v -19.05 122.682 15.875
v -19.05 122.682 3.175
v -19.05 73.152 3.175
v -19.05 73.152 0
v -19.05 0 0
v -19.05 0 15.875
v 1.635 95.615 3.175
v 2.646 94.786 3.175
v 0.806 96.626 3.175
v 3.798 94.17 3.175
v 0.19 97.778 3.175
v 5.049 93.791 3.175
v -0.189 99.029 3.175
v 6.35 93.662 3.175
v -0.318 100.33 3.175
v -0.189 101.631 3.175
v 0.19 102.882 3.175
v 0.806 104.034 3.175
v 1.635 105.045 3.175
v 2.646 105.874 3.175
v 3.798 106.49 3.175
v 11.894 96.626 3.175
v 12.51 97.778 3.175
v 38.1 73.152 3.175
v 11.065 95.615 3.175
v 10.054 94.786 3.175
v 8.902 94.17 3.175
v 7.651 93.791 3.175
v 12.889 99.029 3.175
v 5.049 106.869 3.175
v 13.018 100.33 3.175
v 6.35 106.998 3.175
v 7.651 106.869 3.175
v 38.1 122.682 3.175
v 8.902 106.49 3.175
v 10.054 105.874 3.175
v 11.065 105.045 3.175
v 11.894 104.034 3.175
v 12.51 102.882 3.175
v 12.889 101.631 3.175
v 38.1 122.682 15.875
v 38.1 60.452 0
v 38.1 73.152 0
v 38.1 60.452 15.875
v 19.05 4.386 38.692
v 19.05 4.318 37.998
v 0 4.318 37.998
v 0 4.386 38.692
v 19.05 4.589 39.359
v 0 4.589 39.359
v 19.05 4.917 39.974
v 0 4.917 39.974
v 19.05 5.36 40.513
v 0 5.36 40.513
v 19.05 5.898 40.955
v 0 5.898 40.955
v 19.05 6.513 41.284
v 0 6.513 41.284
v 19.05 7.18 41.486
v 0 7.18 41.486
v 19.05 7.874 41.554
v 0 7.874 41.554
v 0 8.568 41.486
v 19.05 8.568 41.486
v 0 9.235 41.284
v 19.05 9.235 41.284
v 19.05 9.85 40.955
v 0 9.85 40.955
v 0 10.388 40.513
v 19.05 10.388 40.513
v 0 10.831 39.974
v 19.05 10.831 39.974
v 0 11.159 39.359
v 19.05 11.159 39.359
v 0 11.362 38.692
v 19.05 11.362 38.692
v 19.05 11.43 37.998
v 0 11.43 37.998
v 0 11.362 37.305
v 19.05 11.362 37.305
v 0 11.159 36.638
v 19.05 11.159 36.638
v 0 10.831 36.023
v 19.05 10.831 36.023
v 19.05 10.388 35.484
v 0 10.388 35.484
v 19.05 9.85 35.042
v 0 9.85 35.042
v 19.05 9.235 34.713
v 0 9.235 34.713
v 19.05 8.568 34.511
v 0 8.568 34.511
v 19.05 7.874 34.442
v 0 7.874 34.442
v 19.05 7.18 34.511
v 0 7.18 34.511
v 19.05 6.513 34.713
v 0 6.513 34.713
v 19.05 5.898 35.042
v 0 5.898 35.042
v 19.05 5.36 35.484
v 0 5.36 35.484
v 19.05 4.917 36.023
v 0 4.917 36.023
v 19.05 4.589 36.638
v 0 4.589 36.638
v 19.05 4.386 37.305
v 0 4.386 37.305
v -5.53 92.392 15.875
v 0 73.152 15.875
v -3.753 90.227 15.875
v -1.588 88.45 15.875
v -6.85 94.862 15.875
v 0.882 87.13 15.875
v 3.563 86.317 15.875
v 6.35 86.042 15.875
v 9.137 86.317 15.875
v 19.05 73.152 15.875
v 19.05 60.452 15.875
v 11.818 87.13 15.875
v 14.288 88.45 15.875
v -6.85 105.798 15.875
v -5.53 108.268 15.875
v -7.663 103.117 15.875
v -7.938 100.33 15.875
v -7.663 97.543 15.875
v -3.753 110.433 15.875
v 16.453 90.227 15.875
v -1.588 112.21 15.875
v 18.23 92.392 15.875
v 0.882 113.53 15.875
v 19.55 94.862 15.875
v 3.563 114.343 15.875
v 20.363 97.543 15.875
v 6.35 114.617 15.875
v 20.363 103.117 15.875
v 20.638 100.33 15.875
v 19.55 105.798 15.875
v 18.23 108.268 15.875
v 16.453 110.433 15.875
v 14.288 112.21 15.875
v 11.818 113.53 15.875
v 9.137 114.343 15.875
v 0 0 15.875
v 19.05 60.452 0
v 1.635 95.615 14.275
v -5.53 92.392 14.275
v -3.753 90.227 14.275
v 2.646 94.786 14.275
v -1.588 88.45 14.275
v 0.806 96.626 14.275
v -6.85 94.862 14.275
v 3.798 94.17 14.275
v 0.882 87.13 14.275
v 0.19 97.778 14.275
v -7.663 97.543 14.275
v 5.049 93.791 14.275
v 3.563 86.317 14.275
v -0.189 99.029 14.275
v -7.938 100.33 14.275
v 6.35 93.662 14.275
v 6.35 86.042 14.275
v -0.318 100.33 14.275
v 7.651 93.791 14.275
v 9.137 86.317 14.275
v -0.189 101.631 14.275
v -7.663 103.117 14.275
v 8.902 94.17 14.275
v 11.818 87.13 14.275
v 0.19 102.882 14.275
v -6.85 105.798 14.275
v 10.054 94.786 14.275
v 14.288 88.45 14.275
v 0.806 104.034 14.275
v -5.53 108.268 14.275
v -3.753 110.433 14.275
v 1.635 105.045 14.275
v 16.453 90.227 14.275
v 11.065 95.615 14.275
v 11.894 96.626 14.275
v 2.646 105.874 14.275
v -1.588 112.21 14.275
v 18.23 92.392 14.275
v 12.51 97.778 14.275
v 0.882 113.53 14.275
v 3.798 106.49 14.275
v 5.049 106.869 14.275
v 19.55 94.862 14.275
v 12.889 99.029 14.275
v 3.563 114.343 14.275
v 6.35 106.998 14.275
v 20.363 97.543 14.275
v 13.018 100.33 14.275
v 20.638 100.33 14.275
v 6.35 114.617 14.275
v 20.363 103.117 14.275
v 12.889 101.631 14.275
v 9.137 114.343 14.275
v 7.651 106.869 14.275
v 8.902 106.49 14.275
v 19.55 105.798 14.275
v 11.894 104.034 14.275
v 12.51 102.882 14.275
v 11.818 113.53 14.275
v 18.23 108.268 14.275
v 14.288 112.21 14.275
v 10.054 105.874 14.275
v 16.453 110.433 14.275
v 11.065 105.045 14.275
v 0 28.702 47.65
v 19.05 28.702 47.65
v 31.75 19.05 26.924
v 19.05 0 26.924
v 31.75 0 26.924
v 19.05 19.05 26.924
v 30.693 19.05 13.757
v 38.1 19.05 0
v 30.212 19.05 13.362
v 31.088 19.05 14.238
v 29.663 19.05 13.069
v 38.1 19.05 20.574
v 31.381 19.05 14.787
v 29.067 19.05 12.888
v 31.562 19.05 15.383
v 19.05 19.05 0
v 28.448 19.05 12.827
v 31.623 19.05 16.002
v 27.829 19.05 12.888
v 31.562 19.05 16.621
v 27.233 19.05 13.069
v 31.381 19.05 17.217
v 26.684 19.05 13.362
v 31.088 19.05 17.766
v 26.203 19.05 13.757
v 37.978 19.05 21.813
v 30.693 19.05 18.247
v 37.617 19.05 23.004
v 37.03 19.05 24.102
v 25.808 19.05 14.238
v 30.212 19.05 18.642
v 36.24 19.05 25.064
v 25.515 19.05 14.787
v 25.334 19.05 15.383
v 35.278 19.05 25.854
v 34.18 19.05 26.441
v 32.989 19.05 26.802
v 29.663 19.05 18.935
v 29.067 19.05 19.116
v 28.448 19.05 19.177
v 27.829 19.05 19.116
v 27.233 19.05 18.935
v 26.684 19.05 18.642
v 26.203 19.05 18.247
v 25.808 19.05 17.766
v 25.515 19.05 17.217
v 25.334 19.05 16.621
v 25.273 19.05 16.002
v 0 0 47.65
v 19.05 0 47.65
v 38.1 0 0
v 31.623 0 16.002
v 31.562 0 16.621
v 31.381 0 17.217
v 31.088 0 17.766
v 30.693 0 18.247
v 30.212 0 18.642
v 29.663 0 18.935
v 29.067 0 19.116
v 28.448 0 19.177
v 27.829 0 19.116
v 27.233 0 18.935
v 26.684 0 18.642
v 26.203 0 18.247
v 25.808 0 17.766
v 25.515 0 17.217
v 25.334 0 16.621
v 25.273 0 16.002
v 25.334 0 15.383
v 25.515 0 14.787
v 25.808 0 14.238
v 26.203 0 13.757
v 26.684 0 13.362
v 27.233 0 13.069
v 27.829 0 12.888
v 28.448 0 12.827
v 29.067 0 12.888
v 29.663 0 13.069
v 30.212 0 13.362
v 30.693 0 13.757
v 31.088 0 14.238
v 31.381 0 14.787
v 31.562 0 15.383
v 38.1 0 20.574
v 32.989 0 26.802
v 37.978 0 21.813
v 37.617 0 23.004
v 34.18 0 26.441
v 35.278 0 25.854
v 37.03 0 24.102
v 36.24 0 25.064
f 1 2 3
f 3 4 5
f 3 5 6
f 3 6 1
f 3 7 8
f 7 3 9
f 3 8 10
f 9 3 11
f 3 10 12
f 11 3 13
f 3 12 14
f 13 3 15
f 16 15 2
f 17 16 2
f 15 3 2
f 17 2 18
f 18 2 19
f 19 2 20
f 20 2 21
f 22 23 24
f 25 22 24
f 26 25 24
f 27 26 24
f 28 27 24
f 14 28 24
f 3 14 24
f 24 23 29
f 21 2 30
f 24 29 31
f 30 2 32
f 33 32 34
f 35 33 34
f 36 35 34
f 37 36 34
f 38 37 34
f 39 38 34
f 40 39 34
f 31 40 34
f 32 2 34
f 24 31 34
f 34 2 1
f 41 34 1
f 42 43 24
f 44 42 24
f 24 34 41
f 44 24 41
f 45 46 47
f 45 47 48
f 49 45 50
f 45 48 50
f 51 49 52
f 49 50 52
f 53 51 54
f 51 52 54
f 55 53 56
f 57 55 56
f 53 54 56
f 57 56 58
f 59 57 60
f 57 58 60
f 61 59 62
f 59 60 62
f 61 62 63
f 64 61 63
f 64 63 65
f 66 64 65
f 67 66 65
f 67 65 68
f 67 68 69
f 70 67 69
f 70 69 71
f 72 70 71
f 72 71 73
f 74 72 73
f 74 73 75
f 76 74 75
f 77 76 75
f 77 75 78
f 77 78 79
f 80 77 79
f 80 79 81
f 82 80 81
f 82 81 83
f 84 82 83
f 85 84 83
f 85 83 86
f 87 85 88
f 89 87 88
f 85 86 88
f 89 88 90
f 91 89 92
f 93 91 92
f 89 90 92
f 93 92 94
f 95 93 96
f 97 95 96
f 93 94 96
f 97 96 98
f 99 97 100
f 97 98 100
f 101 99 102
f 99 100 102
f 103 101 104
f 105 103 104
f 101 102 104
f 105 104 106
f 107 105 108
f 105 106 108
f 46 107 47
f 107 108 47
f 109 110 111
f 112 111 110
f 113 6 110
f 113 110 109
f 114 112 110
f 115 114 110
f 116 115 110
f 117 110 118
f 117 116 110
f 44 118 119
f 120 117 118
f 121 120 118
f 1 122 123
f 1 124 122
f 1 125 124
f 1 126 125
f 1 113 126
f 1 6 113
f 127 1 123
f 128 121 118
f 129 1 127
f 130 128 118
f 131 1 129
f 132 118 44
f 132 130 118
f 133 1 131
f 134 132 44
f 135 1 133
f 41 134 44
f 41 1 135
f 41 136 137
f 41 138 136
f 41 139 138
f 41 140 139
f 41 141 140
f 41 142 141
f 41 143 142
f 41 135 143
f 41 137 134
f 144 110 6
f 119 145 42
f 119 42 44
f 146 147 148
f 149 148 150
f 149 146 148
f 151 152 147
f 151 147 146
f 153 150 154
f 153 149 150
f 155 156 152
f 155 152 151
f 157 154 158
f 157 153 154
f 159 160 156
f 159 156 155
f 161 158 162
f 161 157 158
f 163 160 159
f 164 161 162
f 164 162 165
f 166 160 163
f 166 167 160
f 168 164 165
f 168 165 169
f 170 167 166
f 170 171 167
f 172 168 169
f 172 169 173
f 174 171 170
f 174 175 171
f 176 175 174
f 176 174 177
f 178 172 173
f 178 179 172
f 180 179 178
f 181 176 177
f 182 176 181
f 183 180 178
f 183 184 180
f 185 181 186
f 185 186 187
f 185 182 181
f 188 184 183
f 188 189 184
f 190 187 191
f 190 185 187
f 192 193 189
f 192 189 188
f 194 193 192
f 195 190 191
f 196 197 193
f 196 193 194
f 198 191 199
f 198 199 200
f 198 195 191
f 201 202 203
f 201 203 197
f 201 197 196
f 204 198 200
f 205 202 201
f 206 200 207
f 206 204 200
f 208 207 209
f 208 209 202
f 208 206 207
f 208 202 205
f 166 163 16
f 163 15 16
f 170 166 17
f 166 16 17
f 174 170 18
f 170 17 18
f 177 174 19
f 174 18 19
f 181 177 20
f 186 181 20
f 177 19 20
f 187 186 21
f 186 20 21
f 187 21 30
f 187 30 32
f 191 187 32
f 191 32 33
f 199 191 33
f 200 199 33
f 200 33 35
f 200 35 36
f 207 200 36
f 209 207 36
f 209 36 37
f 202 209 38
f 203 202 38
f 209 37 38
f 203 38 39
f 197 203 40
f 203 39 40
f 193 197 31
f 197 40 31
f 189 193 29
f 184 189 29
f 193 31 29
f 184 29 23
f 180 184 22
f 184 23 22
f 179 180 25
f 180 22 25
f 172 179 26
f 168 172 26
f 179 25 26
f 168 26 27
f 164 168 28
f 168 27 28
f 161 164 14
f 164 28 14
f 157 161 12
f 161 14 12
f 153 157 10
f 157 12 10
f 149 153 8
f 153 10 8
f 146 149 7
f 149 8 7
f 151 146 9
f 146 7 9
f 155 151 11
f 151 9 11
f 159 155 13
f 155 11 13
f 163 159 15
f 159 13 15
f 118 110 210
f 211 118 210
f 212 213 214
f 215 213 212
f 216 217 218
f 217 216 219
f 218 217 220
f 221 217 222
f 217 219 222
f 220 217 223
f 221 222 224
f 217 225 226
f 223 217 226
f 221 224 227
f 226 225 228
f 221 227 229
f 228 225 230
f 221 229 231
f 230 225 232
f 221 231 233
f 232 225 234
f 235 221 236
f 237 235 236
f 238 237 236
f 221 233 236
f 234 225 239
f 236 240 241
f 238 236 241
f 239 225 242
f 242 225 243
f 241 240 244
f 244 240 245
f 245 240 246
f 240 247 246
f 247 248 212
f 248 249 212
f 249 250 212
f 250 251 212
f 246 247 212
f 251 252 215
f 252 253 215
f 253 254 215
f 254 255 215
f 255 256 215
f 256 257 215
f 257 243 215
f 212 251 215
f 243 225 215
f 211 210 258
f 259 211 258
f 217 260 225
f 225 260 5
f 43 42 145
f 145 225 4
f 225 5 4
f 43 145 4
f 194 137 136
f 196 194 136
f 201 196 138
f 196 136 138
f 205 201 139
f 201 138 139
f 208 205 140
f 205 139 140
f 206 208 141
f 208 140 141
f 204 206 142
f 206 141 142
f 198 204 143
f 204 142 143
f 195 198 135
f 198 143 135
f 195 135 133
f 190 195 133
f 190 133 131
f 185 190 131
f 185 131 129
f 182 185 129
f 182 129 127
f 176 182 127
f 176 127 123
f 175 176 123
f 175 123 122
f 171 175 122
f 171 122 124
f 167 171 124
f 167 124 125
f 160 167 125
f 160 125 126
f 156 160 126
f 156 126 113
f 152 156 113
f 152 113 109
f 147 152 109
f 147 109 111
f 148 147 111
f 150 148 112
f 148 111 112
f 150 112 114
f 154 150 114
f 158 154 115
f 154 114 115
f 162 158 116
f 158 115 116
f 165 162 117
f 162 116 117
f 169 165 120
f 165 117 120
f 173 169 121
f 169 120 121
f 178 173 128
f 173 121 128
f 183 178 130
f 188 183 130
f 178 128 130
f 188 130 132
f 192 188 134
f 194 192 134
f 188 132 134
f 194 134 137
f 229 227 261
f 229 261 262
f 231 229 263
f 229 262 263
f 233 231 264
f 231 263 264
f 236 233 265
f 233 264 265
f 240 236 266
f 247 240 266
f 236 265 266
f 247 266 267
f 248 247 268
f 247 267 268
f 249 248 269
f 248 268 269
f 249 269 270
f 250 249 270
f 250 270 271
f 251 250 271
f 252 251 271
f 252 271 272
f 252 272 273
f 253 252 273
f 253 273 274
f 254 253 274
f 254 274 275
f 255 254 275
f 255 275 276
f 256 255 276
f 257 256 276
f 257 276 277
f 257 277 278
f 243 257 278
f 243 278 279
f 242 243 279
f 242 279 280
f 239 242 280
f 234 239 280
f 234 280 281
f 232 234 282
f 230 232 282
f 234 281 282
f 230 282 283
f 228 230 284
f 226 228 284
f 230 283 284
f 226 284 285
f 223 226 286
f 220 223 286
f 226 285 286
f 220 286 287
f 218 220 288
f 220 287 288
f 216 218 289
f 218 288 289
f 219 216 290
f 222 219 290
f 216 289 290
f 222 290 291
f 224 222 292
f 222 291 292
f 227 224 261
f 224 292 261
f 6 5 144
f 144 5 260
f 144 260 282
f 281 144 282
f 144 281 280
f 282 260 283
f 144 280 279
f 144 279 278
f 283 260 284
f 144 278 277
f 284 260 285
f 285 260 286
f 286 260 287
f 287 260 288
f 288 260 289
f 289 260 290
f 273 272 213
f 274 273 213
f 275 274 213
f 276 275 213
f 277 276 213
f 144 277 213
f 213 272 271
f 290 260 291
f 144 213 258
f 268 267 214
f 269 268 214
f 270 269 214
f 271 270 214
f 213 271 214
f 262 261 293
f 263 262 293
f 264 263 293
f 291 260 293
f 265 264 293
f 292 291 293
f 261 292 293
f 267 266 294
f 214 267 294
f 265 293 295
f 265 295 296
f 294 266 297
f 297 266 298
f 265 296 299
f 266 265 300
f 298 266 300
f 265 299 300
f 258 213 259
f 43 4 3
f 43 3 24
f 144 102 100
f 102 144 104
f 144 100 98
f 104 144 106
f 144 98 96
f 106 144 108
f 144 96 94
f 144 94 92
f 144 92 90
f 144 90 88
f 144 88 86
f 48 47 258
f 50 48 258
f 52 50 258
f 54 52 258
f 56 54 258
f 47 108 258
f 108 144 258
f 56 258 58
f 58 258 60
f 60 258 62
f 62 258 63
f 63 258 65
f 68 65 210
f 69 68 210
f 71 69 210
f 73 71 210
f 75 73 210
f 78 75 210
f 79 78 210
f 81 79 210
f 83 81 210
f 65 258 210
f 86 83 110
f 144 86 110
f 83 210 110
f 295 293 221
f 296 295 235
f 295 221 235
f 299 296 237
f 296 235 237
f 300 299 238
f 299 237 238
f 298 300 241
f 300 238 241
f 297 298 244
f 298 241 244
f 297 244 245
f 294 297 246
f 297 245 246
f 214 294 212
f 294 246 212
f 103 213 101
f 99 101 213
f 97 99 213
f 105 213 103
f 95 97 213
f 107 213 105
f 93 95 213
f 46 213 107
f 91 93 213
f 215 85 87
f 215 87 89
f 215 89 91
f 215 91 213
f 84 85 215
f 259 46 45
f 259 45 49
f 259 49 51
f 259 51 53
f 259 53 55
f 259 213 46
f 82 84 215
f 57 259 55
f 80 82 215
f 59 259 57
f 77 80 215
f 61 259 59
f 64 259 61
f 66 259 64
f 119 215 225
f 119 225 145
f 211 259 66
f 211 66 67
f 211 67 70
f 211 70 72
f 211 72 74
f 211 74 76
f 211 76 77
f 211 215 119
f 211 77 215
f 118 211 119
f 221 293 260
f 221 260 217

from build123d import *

# Parameters (mm, degrees)
F0_W            = 73.152
F0_H            = 15.875
F1_DEPTH        = 19.05
F3_D            = 7.112
F4_W            = 19.05
F4_H            = 26.924
F5_DEPTH        = 19.05
F7_D            = 6.35
F8_DEPTH        = 19.05
F9_DEPTH        = 49.53
F10_DEPTH       = 38.1
F11_DEPTH       = 12.7
F13_W           = 57.15
F13_H           = 49.53
F14_DEPTH       = 3.175
F16_D           = 13.335
F16_CBORE_D     = 28.575
F16_CBORE_DEPTH = 1.6002
F17_DEPTH       = 25.4


with BuildPart() as f1:
    # F0 (on Right) → F1 (new body)
    with BuildSketch(Plane.YZ):
        Polygon((0, 47.6504), (0, 15.875), (73.152, 15.875), (28.702, 47.6504), align=None)
        with Locations((36.576, 7.9375)):
            Rectangle(F0_W, F0_H)
    extrude(amount=F1_DEPTH)

    # F3 (through all)
    with Locations(Plane.YZ.offset(19.05)):
        with Locations((7.874, 37.9984)):
            Hole(F3_D / 2)

    # F4 (on face) → F5 (join)
    with BuildSketch(Plane.YZ.offset(19.05)):
        with Locations((9.525, 13.462)):
            Rectangle(F4_W, F4_H)
    extrude(amount=F5_DEPTH)

    # F7 (through all)
    with Locations(Plane(origin=(0, 19.05, 0), x_dir=(-1, 0, 0), z_dir=(0, 1, 0))):
        with Locations((-28.448, 16.002)):
            Hole(F7_D / 2)


with BuildPart() as f8:
    # F0 (on Right) → F8 (new body)
    with BuildSketch(Plane.YZ):
        with Locations((36.576, 7.9375)):
            Rectangle(F0_W, F0_H)
    extrude(amount=-F8_DEPTH)


with BuildPart() as f9:
    # F9 (new): a face of the model
    f9_faces = [f8.part.faces().sort_by_distance(p)[0] for p in [
        (-9.525, 73.152, 7.9375),
    ]]
    extrude(f9_faces, amount=F9_DEPTH)


with BuildPart() as f10:
    # F10 (new): a face of the model
    f10_faces = [f9.part.faces().sort_by_distance(p)[0] for p in [
        (0, 97.917, 7.9375),
    ]]
    extrude(f10_faces, amount=F10_DEPTH)


with BuildPart() as f11:
    # F11 (new): a face of the model
    f11_faces = [f10.part.faces().sort_by_distance(p)[0] for p in [
        (19.05, 73.152, 7.9375),
    ]]
    extrude(f11_faces, amount=F11_DEPTH)


with BuildPart() as f1_1:
    add(f1.part)

    # F12: union F8, F9, F10, F11
    add(f8.part)
    add(f9.part)
    add(f10.part)
    add(f11.part)

    # F13 (on Top) → F14 (cut)
    with BuildSketch(Plane.XY):
        with Locations((9.525, 97.917)):
            Rectangle(F13_W, F13_H)
    extrude(amount=F14_DEPTH, mode=Mode.SUBTRACT)

    # F16 (through all)
    with Locations(Plane.XY.offset(15.875)):
        with Locations((6.35, 100.33)):
            CounterBoreHole(F16_D / 2, F16_CBORE_D / 2, F16_CBORE_DEPTH)

    # F6 (on face) → F17 (cut)
    with BuildSketch(Plane(origin=(0, 19.05, 0), x_dir=(-1, 0, 0), z_dir=(0, 1, 0))):
        with BuildLine():
            ThreePointArc((-38.1, 20.574), (-36.2401280605, 25.0641280605), (-31.75, 26.924))
            Line((-31.75, 26.924), (-38.1, 26.924))
            Line((-38.1, 26.924), (-38.1, 20.574))
        make_face()
    extrude(amount=-F17_DEPTH, mode=Mode.SUBTRACT)


solid = f1_1.part
